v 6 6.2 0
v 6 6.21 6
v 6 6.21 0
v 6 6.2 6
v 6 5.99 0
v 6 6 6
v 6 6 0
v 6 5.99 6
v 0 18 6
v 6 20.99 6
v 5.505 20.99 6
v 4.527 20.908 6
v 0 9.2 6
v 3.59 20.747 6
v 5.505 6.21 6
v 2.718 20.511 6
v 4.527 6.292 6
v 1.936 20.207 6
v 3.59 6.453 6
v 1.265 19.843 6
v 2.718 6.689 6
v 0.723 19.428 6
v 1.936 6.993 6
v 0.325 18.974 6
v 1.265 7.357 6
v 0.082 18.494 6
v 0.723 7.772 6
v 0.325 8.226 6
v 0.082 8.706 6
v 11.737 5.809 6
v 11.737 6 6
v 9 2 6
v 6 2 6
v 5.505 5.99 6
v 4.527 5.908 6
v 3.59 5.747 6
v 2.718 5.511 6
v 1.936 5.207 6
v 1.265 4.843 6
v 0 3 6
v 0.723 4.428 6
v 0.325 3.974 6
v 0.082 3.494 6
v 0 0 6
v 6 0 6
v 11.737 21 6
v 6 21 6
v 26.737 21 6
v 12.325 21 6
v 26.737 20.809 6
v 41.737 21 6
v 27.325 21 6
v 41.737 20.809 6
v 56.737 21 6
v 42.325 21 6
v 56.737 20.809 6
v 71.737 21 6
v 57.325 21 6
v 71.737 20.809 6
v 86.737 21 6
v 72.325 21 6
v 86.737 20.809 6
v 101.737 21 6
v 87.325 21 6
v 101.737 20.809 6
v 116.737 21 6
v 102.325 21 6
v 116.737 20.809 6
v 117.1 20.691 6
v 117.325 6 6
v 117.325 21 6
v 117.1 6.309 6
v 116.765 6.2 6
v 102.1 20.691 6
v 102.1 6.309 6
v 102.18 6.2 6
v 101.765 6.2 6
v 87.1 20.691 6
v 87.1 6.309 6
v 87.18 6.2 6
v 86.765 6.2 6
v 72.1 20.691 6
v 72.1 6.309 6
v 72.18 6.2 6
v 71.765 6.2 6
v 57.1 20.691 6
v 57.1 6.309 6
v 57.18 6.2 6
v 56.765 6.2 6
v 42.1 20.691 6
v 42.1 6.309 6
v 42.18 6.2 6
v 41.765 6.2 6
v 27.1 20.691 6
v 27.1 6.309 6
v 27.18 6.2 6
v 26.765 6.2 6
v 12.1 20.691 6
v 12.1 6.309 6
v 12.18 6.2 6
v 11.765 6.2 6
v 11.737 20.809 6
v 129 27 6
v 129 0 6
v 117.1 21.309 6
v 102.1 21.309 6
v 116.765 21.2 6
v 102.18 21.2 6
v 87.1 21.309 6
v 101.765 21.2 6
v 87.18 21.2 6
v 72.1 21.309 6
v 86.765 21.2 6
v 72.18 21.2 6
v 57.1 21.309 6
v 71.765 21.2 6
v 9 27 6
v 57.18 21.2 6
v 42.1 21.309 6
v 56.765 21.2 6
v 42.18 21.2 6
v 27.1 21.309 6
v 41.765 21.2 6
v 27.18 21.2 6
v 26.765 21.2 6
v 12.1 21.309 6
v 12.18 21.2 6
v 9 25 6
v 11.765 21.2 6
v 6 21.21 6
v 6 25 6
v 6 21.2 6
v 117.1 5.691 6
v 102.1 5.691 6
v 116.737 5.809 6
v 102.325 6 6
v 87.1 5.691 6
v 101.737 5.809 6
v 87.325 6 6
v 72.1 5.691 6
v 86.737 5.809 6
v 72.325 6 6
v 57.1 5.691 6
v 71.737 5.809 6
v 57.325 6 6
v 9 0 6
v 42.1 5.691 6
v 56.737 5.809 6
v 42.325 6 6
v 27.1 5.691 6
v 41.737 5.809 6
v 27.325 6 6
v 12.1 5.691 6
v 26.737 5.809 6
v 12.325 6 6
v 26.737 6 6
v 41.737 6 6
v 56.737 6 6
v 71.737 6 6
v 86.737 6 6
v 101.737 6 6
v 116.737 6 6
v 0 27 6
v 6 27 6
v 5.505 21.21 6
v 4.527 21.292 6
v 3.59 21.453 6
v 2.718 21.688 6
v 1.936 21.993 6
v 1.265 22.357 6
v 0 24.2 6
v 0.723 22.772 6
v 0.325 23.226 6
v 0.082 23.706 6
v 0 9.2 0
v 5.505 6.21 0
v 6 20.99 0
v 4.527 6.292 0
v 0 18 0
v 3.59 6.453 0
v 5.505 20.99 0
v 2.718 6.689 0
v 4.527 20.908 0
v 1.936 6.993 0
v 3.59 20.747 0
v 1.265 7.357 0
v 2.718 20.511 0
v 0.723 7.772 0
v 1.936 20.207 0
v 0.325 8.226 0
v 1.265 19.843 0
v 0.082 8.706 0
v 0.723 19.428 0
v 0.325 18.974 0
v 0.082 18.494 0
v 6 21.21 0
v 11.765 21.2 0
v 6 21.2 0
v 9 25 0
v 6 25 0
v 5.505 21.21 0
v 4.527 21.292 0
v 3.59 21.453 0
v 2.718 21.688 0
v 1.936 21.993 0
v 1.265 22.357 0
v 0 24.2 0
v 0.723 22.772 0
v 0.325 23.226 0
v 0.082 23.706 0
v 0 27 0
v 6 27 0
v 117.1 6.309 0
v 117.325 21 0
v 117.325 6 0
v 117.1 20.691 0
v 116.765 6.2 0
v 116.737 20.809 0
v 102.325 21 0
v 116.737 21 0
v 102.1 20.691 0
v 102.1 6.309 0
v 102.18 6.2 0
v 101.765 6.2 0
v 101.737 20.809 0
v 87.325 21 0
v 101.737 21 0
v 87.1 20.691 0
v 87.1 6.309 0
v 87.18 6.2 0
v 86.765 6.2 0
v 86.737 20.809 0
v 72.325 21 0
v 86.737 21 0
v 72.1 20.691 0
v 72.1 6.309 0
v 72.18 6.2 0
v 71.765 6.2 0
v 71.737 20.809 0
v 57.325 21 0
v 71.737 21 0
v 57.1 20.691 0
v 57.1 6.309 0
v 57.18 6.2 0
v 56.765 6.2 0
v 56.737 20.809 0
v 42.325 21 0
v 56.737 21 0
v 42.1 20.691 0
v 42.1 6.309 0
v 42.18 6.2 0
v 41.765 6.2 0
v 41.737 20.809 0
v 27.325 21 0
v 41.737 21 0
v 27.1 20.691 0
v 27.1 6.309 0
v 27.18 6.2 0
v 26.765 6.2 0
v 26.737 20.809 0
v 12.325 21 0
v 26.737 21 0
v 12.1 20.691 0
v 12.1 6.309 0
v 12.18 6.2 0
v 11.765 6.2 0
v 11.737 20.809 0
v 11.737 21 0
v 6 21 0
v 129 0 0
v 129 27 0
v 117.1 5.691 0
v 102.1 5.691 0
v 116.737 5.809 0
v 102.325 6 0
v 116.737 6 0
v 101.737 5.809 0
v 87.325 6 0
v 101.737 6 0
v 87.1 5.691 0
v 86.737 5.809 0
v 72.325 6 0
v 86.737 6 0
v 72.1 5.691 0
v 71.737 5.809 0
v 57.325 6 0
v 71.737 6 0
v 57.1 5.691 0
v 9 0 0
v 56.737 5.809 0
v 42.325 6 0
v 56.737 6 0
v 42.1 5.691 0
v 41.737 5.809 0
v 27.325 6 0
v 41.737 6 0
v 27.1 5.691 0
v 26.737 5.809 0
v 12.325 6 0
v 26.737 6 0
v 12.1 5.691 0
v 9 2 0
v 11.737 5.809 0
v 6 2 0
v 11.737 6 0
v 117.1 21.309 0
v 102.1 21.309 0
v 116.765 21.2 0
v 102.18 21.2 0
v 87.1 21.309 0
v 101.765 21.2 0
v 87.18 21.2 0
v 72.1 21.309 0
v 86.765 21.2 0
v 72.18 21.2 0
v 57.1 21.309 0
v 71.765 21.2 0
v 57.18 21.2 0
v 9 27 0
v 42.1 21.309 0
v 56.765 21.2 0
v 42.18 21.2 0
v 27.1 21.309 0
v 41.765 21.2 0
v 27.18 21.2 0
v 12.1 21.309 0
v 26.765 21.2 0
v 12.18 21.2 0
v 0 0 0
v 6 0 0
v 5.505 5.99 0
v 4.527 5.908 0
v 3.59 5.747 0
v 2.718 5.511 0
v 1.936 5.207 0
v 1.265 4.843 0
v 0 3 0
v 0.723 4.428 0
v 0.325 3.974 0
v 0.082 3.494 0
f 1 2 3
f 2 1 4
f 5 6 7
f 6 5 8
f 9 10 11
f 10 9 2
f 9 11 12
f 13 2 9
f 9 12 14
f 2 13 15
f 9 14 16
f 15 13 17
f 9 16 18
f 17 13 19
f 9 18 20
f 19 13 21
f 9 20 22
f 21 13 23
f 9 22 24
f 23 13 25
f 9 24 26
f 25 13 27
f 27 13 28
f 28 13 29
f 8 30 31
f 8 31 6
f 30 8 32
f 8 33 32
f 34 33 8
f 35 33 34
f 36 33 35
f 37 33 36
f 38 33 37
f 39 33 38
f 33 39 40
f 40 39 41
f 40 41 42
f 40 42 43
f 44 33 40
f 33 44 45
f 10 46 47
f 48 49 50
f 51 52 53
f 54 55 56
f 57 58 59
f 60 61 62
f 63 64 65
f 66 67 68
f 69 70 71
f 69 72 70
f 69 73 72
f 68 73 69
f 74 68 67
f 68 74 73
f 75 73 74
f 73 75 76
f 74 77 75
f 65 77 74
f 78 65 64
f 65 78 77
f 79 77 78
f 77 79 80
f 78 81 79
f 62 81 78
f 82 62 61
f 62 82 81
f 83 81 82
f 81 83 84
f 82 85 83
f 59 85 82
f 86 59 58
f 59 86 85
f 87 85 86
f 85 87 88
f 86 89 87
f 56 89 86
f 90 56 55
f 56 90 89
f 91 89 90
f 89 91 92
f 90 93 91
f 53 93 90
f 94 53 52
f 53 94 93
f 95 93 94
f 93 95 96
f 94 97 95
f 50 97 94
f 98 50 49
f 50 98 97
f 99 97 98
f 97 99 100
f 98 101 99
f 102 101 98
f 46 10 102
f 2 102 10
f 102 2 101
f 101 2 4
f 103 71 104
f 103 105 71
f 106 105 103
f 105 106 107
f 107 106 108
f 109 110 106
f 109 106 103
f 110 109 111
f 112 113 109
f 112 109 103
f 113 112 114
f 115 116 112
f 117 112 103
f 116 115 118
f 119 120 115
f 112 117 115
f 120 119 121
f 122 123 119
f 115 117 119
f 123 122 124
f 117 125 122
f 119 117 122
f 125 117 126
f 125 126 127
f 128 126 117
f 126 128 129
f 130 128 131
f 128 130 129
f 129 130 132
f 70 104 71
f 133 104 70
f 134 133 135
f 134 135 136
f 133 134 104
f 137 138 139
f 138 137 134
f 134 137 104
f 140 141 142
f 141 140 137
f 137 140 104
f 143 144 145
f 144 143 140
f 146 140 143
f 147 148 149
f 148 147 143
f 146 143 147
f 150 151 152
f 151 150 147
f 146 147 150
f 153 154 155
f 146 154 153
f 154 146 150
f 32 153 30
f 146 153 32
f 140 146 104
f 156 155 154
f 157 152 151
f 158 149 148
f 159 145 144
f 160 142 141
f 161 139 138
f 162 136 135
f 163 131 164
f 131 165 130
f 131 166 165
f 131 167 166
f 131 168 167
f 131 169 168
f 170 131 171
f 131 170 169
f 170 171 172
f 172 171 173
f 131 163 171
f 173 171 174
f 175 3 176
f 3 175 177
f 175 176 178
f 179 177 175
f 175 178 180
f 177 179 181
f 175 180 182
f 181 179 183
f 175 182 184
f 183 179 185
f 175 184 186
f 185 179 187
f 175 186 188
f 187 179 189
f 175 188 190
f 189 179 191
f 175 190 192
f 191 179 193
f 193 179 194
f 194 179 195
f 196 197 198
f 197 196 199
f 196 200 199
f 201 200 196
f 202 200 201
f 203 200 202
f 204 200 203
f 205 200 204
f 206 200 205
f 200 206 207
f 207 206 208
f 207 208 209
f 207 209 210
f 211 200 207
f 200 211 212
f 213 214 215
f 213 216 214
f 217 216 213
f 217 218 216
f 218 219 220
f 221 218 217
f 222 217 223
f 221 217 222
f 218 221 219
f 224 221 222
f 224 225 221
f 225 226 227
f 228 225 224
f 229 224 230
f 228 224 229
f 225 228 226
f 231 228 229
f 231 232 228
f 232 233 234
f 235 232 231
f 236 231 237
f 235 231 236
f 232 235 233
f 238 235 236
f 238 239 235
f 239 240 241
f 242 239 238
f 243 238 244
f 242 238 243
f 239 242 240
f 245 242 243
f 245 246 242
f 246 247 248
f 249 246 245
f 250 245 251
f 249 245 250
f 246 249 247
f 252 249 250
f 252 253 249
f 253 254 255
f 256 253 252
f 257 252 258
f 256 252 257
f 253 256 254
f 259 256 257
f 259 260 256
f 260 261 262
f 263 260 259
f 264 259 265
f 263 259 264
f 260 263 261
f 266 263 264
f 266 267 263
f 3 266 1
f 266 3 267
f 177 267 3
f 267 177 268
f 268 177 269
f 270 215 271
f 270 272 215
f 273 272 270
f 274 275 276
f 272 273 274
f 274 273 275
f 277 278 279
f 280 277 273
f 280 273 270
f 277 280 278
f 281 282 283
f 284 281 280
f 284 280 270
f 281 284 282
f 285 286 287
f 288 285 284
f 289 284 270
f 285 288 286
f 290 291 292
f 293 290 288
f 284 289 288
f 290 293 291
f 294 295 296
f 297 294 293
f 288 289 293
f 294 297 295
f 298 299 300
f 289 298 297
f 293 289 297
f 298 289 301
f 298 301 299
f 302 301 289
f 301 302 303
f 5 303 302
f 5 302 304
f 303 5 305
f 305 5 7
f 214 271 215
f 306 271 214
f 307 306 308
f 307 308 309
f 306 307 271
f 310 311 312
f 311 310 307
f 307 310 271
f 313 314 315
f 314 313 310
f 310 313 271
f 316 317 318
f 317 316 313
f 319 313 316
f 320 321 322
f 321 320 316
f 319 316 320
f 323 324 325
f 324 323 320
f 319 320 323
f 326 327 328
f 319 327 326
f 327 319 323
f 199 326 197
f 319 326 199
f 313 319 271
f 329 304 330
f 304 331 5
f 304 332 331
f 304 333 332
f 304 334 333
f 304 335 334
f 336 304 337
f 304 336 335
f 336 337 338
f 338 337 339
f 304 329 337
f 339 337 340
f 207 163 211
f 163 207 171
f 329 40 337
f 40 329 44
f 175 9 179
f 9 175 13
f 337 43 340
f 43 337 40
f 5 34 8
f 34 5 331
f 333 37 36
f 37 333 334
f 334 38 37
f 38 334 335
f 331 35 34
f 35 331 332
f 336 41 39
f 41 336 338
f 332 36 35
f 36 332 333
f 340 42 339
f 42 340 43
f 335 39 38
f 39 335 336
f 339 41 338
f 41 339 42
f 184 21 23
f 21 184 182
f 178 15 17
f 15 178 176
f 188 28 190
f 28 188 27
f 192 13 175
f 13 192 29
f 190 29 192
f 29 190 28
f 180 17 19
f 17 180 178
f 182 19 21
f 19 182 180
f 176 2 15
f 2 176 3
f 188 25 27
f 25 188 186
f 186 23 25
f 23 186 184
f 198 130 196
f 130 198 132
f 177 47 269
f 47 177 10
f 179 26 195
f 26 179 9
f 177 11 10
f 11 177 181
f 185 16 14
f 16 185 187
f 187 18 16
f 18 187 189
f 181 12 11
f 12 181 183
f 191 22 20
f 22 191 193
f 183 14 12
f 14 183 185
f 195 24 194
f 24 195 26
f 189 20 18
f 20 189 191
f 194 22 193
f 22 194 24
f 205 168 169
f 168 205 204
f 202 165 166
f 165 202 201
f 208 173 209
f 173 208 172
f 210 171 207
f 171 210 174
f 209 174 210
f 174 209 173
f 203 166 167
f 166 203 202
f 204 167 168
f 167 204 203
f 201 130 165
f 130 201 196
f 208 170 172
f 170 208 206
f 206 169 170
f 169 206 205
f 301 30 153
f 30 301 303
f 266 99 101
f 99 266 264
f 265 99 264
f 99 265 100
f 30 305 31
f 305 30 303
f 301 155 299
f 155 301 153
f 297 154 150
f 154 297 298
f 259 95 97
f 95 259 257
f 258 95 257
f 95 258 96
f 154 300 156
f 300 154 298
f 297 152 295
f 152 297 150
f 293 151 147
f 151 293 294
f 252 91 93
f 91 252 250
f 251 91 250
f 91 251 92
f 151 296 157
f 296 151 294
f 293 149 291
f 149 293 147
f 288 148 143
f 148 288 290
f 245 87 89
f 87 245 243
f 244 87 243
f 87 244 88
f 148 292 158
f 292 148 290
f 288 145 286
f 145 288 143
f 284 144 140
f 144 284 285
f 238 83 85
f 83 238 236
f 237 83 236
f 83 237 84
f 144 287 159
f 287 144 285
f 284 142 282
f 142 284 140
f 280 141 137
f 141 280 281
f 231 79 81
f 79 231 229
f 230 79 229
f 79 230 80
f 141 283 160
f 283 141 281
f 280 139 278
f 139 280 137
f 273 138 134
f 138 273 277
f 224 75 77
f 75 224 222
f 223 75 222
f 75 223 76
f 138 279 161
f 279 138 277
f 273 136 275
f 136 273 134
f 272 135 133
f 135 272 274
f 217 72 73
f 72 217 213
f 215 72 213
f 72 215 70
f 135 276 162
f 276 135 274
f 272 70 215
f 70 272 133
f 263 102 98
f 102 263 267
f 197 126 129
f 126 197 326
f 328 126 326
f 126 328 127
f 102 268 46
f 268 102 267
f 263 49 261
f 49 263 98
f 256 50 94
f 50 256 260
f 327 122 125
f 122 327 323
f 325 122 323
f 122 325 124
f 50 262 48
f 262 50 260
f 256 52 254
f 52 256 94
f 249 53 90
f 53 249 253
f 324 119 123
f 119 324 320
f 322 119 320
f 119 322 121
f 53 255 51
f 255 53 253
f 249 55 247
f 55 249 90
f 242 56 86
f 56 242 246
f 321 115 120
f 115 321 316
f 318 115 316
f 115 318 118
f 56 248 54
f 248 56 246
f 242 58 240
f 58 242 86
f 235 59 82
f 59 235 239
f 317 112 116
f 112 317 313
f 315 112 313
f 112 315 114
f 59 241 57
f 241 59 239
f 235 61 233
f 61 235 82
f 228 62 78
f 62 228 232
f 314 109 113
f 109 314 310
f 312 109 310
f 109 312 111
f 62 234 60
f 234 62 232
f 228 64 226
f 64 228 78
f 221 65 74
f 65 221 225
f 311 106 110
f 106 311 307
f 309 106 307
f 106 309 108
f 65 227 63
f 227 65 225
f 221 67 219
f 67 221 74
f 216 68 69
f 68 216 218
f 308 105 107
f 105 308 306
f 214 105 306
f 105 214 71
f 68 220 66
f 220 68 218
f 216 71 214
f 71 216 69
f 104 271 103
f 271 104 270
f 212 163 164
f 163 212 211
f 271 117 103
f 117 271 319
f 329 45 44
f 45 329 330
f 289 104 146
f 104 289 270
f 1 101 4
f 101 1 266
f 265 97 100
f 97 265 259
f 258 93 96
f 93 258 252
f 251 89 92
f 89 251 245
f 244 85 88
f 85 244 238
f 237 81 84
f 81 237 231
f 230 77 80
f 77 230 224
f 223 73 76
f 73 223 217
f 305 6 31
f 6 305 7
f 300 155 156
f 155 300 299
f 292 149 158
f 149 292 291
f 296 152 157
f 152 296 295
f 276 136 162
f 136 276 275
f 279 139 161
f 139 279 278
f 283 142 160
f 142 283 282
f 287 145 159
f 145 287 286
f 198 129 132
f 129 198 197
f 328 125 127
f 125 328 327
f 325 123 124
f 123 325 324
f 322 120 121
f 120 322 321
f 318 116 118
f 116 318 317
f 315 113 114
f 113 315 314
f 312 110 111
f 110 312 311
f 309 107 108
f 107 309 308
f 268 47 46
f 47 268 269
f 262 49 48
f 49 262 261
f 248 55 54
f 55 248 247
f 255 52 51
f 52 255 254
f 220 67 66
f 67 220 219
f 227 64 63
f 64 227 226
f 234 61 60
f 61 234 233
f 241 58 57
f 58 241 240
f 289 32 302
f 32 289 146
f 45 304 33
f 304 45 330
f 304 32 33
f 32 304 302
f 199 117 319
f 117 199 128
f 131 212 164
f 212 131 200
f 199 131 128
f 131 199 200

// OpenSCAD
// file: config.scad
$rows = 8;
$columns = 8;
$height = 8.5;
$distance = 15;
$gutter = 8;

$led_diameter = 3;
$led_height = 5;
$flange_height = 1;
$flange_diameter = 3.5;
$flange_flat_diameter = 3.4;
$snug_clearance = 0.2;
$lead_diameter = 0.5;

$wire_guide_distance = 5.5;
$wire_guide_height = 2.5;

function extent(holes) = (holes - 1) * $distance + 2 * $gutter;
function snugly(diameter) = diameter / cos(180 / fragments(diameter)) + 2 * $snug_clearance;
function fragments(diameter) = $fn > 0.0 ? max(3.0, $fn) : ceil(max(min(360.0 / $fa, diameter * PI / $fs), 5));
// main file
$fs = 1;
$fa = 0.1;

include <config.scad>;

$extra = 12;
$thickness = 6;
$arm_width = 6;
$gap_width = 0.2;

module guide_notch() {
    scale([1,0.5,1])
        difference() {
            cube([$arm_width, 2 * $arm_width + 0.4, $thickness]);
            translate([$arm_width, 0, 0]) cylinder(r = $arm_width, h = $thickness);
            translate([$arm_width, 2 * $arm_width + 2 * $gap_width, 0]) cylinder(r = $arm_width, h = $thickness);
        }
}

difference() {
    cube([($rows - 1) * $distance + 2 * $extra, 2 * $arm_width + $distance, $thickness]);

    translate([$extra - $arm_width, $arm_width, 0]) cube([($rows - 1) * $distance + ($extra - $arm_width), $gap_width, $thickness]);
    translate([$extra - $arm_width, $arm_width + $distance, 0]) cube([($rows - 1) * $distance + ($extra - $arm_width), $gap_width, $thickness]);

    translate([0, $arm_width/2, 0]) guide_notch();
    translate([0, $arm_width/2 + $distance, 0]) guide_notch();

    for (i = [0:$rows - 1])
        translate([$extra + i * $distance, $arm_width, 0])
            cylinder(d = 0.65, h = $thickness);
    for (i = [0:$rows - 1])
        translate([$extra + i * $distance, $arm_width + $distance, 0])
            cylinder(d = 0.65, h = $thickness);

    translate([$extra - $arm_width, 0, 0]) cube([3, 2, $thickness]);
    translate([$extra - $arm_width, $distance + 2 * $arm_width - 2, 0]) cube([3, 2, $thickness]);
}
